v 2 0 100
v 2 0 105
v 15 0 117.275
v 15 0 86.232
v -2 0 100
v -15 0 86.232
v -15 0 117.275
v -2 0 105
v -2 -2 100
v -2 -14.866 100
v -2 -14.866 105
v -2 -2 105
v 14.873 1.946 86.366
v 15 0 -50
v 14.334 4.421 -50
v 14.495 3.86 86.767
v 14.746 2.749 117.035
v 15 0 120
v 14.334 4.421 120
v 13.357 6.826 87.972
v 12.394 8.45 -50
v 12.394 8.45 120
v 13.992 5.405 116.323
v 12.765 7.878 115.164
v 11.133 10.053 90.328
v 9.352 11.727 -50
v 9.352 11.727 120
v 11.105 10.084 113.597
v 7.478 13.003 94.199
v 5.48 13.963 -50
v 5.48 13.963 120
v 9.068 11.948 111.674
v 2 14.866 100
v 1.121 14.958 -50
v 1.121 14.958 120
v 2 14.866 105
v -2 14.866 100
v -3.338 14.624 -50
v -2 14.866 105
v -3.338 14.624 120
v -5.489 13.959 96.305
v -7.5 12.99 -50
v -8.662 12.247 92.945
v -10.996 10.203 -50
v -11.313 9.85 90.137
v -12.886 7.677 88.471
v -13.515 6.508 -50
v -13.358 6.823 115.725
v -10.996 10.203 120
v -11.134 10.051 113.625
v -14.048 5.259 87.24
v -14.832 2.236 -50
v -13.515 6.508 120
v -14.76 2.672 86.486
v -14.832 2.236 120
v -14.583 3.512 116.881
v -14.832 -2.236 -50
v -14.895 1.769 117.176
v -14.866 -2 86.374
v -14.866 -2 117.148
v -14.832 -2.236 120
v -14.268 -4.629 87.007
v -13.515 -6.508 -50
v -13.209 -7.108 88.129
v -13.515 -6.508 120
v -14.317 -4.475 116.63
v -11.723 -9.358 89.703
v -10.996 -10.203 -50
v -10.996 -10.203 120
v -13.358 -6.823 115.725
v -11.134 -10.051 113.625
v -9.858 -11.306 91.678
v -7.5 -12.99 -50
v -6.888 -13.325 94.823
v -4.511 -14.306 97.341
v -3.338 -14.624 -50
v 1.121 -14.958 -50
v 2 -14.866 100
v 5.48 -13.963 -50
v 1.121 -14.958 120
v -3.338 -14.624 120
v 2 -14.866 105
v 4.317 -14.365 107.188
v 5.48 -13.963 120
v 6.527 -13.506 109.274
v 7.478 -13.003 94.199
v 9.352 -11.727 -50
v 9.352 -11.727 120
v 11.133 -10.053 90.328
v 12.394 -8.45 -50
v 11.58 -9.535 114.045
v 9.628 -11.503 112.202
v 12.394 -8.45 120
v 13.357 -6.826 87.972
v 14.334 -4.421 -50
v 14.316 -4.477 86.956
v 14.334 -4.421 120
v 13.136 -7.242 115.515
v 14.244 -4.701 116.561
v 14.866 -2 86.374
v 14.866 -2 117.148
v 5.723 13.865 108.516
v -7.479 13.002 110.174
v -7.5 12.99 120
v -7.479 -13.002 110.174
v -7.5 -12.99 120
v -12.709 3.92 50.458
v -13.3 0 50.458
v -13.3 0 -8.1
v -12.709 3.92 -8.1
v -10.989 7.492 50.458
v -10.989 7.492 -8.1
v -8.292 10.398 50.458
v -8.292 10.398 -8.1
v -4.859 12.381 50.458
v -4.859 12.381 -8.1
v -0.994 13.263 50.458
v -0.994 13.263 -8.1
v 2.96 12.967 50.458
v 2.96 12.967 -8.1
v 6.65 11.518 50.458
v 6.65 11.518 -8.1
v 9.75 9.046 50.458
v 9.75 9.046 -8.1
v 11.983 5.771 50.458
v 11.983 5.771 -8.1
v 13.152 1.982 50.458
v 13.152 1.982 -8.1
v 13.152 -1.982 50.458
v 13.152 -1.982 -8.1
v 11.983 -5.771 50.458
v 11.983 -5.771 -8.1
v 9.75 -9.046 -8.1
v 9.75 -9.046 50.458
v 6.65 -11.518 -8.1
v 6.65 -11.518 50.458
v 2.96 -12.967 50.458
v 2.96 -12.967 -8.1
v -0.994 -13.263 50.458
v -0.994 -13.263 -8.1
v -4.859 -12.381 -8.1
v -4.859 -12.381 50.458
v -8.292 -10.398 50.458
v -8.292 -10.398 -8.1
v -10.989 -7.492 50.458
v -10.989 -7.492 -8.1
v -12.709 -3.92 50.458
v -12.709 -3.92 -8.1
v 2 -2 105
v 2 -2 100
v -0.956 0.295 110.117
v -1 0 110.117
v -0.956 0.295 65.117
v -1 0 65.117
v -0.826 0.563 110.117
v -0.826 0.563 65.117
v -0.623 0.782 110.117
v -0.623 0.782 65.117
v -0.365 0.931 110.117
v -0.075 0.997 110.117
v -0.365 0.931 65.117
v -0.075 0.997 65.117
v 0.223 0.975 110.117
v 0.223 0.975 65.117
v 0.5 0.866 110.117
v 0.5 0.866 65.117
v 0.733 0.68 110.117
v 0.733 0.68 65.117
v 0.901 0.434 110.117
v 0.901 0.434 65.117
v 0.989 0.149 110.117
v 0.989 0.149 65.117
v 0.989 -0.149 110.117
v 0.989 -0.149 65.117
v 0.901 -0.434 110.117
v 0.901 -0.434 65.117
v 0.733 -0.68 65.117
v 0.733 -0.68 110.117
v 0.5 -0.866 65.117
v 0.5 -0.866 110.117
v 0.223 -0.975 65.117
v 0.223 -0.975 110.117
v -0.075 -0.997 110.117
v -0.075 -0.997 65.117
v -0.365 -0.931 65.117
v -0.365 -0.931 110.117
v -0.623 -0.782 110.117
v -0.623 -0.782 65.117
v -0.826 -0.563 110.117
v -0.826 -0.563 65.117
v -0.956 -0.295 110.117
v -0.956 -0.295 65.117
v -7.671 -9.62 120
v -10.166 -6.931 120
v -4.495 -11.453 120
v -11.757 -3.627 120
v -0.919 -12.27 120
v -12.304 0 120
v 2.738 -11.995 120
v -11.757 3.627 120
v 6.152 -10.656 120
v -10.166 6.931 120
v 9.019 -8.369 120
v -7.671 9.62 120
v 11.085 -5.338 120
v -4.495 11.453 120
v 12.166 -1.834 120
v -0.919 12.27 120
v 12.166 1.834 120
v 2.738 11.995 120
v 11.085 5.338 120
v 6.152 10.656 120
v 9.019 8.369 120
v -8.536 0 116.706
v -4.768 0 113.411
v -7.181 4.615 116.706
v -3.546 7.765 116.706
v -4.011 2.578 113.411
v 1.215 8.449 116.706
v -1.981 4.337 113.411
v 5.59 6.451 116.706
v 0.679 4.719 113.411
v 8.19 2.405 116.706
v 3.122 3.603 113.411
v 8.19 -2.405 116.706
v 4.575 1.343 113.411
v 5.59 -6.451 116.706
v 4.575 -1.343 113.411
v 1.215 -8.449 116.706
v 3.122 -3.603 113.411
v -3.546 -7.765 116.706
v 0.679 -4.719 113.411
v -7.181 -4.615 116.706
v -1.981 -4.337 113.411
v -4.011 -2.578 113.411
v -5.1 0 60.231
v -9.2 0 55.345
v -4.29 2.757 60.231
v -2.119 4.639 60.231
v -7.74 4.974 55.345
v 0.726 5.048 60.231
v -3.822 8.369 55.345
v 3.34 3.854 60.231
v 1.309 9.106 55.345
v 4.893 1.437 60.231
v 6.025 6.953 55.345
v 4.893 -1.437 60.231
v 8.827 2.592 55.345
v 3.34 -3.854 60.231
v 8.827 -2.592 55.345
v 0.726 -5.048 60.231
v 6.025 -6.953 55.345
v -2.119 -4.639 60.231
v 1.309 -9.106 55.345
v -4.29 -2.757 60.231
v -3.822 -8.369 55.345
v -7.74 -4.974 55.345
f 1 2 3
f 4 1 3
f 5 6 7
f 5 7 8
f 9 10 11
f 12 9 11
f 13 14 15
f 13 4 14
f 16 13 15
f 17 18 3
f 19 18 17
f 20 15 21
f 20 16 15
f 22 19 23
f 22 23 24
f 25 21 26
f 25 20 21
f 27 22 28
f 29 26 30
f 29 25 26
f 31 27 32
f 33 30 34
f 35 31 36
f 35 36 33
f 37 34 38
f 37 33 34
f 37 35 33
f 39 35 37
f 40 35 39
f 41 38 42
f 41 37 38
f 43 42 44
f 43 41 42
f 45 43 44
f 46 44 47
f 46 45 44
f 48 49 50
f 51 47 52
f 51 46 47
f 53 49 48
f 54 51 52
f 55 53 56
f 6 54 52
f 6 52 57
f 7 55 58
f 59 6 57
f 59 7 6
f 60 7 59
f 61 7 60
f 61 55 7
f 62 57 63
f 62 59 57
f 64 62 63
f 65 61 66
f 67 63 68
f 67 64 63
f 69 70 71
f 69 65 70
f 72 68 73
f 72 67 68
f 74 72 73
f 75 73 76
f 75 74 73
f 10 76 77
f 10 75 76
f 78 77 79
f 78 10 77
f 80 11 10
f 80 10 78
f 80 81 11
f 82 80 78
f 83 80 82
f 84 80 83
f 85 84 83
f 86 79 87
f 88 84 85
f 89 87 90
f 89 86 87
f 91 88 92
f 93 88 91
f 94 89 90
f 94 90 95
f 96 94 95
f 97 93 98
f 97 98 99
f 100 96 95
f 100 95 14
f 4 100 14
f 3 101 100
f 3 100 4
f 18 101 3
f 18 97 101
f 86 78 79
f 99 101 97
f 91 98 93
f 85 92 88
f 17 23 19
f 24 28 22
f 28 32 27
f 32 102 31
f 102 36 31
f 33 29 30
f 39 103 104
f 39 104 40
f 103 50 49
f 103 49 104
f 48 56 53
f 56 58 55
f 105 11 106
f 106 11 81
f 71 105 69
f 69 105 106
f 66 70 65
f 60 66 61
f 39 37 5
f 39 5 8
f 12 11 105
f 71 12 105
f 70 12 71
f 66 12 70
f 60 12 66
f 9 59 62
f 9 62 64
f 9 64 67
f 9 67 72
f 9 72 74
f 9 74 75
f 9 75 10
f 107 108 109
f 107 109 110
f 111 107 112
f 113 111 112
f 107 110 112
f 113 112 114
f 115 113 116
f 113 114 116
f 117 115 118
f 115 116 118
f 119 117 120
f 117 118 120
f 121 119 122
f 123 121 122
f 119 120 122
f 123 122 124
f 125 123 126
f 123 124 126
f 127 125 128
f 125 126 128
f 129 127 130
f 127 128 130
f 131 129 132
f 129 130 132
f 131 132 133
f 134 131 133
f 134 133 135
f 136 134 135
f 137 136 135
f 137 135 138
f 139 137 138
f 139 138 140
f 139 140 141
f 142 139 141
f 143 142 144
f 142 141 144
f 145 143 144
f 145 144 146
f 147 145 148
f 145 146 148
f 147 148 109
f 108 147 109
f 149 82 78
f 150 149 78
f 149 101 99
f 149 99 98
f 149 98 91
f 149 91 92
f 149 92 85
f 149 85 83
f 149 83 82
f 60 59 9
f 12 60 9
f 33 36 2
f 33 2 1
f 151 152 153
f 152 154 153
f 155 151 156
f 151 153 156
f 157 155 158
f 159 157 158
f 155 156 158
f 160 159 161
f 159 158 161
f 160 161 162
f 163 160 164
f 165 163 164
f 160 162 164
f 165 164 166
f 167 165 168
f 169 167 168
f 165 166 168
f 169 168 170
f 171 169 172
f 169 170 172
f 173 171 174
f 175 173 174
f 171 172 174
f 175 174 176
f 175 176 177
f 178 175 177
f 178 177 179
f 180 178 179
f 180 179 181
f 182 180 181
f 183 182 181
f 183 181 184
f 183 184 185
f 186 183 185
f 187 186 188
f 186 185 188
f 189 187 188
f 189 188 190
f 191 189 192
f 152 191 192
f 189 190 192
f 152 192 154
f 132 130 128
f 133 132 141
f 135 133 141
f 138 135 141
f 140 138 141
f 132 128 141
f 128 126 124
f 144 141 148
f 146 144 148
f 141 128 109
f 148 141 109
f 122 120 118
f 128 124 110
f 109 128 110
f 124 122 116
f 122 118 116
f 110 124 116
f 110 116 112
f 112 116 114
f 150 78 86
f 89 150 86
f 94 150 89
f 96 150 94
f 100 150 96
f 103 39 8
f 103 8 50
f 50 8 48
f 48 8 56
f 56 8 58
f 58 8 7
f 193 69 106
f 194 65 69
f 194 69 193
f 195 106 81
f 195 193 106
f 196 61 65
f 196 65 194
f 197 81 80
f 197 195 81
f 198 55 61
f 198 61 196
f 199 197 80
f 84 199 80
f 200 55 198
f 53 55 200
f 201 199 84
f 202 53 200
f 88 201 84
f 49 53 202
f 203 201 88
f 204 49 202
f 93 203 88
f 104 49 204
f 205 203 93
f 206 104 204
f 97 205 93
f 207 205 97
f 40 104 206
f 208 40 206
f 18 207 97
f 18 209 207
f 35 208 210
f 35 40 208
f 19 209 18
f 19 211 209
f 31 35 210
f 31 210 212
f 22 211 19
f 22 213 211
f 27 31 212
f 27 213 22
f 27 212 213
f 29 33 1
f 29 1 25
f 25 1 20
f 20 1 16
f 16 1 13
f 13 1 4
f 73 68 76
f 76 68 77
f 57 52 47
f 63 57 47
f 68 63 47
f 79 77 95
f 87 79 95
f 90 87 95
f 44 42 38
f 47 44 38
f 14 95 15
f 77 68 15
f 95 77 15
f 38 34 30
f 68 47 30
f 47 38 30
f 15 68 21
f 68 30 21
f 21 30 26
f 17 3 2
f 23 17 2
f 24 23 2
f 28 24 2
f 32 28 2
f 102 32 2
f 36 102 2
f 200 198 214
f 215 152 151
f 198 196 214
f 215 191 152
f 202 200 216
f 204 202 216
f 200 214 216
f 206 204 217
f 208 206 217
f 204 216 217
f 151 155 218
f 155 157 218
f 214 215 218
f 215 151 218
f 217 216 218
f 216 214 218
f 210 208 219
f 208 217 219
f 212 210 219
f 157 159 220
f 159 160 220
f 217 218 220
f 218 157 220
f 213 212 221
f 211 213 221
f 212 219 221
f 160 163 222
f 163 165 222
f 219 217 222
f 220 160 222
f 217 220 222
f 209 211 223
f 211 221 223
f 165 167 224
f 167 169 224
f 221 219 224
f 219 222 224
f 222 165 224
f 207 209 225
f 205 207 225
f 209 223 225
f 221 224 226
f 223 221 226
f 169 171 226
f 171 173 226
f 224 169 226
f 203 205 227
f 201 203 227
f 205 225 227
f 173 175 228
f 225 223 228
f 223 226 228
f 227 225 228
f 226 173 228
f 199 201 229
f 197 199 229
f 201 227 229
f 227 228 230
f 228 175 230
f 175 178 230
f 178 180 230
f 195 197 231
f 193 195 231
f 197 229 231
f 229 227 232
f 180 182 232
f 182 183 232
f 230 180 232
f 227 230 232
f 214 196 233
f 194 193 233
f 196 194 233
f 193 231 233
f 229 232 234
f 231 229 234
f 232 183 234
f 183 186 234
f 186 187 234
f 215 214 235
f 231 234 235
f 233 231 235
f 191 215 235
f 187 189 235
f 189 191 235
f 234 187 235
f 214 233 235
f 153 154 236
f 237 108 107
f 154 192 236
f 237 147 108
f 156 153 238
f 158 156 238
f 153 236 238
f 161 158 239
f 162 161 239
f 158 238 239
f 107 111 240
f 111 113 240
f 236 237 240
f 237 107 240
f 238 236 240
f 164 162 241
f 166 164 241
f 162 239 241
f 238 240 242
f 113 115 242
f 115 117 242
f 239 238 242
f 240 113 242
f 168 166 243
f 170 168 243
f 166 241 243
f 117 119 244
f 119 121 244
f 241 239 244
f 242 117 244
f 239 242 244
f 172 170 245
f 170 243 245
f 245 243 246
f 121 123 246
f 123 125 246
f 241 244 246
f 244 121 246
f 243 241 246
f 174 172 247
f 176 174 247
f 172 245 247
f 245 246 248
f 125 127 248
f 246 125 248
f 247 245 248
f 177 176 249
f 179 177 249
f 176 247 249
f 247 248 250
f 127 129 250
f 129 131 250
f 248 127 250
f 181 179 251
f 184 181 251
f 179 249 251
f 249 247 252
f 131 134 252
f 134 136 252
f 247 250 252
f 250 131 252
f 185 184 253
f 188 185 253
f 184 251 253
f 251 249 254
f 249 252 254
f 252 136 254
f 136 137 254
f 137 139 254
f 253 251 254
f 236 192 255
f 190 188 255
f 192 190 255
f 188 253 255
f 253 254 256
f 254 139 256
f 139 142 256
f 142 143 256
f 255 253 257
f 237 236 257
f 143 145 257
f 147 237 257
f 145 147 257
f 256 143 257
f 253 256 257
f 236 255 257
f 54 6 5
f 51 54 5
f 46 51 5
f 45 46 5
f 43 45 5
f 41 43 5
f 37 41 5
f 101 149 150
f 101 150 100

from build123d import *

# Parameters (mm, degrees)
F0_R          = 15
F1_DEPTH      = 120
F1_DEPTH_BACK = 50
F3_START      = 2
F3_DEPTH      = 23
F4_DEPTH      = 25


with BuildPart() as f1:
    # F0 (on Top) → F1 (new body, two sides)
    with BuildSketch(Plane.XY) as f1_sk:
        Circle(F0_R)
    extrude(amount=F1_DEPTH)
    extrude(f1_sk.sketch, amount=-F1_DEPTH_BACK)

    # F2 (on Front) → F3 (cut)
    with BuildSketch(Plane.XZ.offset(F3_START)):
        Polygon((-17.8860742599, 120), (-17, 105), (-17, 84.1139257401), (-2, 100), (-2, 105), align=None)
        Polygon((-17, 70), (-17, 84.1139257401), (-17.8860742599, 83.1755096406), align=None)
        Polygon((2, 100), (17, 84.1139257401), (17, 105), (17.8860742599, 120), (2, 105), align=None)
        Polygon((17, 70), (17.8860742599, 83.1755096406), (17, 84.1139257401), align=None)
    extrude(amount=F3_DEPTH, mode=Mode.SUBTRACT)

    # F2 (on Front) → F4 (cut)
    with BuildSketch(Plane.XZ):
        Polygon((-17.8860742599, 120), (-17, 105), (-17, 84.1139257401), (-2, 100), (-2, 105), align=None)
        Polygon((-17, 70), (-17, 84.1139257401), (-17.8860742599, 83.1755096406), align=None)
        Polygon((2, 100), (17, 84.1139257401), (17, 105), (17.8860742599, 120), (2, 105), align=None)
        Polygon((17, 70), (17.8860742599, 83.1755096406), (17, 84.1139257401), align=None)
    extrude(amount=-F4_DEPTH, mode=Mode.SUBTRACT)

    # F5 (on Front) → F6 (revolve, cut)
    with BuildSketch(Plane.XZ):
        Polygon((0, 123.1170922147), (-15.8692053304, 123.1170922147), (-1, 110.1170922147), (-1, 65.1170922147), (-13.300107735, 50.4583946322), (-13.300107735, -8.0997264013), (0, -8.0997264013), (0, 65.1170922147), (0, 110.1170922147), align=None)
    revolve(axis=Axis((0, 0, 116.6170922147), (0, 0, -1)), mode=Mode.SUBTRACT)


solid = f1.part
